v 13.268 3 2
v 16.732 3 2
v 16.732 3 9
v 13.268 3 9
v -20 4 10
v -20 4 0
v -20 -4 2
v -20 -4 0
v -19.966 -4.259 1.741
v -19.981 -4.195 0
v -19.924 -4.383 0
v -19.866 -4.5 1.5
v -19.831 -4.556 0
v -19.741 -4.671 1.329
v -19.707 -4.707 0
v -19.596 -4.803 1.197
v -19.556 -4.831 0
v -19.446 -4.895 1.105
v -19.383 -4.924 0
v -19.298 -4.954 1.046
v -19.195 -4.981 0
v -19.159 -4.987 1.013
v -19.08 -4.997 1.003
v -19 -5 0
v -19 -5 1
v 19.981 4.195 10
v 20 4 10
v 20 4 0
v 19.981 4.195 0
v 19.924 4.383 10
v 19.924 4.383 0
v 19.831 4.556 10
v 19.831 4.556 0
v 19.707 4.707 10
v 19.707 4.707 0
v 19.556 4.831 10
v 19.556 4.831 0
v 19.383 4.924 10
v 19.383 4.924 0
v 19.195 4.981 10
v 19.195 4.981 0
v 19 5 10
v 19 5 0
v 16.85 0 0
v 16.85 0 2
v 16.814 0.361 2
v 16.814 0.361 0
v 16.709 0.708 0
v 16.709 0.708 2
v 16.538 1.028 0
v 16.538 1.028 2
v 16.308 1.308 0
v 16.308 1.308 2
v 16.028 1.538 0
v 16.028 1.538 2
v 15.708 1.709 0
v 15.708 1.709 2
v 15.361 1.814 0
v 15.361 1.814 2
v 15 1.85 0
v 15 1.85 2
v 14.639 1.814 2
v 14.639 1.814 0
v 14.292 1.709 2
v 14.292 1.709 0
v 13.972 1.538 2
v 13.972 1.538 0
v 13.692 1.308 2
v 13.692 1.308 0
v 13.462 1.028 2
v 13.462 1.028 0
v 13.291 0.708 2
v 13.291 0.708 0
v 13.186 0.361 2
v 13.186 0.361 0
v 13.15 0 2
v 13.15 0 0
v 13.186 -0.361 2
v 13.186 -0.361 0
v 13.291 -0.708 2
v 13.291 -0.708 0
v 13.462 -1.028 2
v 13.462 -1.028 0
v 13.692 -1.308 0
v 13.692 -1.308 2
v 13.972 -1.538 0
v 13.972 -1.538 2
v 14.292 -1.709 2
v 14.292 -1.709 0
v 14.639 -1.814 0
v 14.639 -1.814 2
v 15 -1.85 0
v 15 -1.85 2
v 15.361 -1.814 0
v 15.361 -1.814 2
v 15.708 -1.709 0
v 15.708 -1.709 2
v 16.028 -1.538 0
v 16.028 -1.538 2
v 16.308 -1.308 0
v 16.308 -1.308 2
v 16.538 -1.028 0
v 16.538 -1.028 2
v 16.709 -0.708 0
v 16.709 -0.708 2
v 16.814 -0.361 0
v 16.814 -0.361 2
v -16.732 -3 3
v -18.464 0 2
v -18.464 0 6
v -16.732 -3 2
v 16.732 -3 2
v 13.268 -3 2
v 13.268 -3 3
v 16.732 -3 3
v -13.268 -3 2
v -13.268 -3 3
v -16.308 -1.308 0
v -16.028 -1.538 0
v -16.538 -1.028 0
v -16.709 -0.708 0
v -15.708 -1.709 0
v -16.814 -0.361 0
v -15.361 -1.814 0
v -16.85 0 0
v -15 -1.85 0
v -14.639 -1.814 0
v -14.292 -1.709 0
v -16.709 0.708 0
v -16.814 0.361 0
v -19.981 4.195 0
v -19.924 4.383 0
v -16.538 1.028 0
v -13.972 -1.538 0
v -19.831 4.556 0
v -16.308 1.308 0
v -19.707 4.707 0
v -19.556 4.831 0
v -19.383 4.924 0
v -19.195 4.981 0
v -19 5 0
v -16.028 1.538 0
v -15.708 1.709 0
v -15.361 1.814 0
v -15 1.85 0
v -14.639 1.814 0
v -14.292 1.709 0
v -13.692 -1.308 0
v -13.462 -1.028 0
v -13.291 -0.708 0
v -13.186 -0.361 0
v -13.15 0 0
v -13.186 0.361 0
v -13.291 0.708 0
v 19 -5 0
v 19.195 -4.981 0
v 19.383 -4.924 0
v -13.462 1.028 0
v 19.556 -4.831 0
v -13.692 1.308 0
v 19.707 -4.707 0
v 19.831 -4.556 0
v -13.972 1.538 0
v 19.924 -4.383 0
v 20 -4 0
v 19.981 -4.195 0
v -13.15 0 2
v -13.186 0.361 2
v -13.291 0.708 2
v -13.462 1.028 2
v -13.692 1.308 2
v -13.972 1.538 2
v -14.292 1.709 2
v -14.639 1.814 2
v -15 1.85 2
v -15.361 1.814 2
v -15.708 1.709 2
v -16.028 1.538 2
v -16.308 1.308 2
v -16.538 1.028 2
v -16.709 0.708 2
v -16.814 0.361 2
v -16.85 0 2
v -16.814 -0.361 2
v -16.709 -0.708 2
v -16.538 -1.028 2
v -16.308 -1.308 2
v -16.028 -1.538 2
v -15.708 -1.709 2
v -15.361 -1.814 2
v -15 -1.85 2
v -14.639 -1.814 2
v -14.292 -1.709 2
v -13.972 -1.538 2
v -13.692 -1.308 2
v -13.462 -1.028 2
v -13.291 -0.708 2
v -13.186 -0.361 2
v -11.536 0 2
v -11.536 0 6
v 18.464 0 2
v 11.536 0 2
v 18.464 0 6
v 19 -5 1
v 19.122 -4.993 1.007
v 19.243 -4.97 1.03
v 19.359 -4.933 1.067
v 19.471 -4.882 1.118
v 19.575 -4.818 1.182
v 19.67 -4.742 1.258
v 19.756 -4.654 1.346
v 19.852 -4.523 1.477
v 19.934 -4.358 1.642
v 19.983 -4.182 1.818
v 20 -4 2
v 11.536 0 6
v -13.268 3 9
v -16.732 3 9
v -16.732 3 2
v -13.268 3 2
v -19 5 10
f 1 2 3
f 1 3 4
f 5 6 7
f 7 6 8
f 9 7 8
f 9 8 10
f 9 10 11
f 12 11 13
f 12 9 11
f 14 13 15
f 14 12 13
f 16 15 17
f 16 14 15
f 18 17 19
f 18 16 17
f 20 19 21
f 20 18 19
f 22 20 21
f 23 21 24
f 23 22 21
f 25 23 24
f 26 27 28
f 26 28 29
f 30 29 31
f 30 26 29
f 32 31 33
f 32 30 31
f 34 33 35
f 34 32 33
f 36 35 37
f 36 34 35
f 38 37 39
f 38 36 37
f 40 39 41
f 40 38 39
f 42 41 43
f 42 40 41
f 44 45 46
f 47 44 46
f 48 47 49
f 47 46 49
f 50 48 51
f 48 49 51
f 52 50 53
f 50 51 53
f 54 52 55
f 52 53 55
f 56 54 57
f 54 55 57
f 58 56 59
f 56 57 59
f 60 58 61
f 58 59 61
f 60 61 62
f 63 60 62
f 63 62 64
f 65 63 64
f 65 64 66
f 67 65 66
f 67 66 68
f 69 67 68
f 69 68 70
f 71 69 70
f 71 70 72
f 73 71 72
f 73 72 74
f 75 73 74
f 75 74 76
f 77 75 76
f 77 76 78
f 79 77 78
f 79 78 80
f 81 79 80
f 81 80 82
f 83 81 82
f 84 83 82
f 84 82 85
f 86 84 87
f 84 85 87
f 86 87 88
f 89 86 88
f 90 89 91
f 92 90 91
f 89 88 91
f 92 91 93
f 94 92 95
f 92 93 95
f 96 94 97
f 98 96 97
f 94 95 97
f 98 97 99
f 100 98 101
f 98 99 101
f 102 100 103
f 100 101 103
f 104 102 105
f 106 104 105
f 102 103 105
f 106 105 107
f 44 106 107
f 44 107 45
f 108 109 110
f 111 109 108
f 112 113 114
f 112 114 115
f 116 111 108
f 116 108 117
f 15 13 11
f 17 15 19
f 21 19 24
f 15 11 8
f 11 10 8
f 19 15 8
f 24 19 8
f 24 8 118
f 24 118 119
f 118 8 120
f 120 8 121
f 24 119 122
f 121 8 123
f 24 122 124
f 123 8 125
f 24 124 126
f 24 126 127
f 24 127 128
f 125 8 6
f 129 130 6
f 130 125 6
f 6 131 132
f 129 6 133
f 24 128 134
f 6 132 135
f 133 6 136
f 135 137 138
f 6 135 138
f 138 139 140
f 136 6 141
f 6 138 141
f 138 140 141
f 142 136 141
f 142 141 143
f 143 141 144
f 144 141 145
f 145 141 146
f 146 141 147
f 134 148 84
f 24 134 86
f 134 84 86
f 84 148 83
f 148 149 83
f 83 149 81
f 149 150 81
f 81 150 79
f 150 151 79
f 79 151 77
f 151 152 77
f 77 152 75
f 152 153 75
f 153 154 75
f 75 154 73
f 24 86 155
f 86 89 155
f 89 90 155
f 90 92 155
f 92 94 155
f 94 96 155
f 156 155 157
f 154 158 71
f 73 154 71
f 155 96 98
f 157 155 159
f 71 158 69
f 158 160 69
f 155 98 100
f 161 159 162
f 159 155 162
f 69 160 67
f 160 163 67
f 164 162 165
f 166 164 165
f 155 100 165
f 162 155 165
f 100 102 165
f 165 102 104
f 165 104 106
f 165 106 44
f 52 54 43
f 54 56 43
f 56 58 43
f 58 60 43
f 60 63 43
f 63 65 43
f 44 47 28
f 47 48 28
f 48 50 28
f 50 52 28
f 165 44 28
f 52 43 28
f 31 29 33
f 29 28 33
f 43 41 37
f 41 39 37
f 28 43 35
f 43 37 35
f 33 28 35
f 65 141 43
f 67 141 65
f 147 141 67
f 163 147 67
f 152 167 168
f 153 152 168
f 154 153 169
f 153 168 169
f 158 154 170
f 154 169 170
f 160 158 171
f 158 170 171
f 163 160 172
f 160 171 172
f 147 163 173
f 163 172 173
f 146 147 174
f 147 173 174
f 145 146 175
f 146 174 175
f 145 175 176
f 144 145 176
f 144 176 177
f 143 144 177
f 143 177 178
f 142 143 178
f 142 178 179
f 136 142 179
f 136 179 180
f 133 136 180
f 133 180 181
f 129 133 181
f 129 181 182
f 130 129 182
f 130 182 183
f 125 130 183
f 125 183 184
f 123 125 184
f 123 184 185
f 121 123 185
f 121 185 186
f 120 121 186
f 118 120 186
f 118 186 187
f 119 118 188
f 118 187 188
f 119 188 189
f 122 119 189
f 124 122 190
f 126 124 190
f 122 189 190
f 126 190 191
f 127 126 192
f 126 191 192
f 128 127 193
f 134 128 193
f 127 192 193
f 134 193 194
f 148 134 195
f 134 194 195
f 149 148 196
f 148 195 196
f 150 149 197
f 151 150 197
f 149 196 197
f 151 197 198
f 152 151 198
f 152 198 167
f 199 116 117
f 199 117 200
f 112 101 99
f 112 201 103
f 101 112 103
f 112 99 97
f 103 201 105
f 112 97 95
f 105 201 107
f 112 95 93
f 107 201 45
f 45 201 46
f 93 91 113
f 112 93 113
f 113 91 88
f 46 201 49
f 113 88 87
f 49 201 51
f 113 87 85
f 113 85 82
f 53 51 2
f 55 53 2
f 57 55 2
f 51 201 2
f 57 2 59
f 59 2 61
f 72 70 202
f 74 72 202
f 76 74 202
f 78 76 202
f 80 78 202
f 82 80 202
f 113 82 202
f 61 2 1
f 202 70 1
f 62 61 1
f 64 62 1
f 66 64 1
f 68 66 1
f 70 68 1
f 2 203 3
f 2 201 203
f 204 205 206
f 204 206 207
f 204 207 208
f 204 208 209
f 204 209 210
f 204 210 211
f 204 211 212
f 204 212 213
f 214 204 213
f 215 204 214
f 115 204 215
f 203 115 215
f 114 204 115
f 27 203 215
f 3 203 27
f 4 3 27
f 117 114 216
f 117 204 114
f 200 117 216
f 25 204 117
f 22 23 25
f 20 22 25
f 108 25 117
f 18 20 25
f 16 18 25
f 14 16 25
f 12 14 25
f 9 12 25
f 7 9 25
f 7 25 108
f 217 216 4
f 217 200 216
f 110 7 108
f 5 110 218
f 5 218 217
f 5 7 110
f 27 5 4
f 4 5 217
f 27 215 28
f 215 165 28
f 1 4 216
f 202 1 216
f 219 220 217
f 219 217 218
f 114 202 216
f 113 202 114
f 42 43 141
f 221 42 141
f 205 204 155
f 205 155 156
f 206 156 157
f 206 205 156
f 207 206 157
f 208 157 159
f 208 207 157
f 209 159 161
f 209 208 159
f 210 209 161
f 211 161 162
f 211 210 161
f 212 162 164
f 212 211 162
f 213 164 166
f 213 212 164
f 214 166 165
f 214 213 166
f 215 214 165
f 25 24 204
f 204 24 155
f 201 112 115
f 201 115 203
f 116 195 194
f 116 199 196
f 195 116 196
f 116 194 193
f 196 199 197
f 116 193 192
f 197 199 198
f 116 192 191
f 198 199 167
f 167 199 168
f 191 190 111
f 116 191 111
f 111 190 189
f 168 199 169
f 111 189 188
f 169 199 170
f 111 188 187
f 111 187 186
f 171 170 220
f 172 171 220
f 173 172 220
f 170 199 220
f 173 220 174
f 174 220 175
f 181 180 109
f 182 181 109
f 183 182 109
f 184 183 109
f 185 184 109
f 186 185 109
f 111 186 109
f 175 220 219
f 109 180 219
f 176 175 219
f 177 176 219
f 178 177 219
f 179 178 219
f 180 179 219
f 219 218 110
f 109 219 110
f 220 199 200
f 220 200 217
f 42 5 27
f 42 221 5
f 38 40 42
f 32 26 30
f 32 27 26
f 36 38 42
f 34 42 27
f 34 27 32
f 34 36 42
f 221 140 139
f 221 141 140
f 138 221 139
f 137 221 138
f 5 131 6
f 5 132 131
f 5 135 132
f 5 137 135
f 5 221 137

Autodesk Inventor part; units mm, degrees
ref_plane "YZ Plane" through (0, 0, 0) normal (1, 0, 0) x (0, 1, 0)
ref_plane "XZ Plane" through (0, 0, 0) normal (0, 1, 0) x (-1, 0, 0)
sketch "Sketch1" plane through (0, 0, 0) normal (0, 0, 1) x (1, 0, 0)
  line L0 (-20, -5) -> (20, -5)
  line L1 (20, -5) -> (20, 5)
  line L2 (20, 5) -> (-20, 5)
  line L3 (-20, 5) -> (-20, -5)
  line L4 (-20, -5) -> (20, 5) construction
  line L5 (20, -5) -> (-20, 5) construction
  point P0 (0, 0)
  dimension "d0" = 10
  dimension "d1" = 40
extrude "Extrusion1" add sketch "Sketch1" along normal blind 10
sketch "Sketch2" plane through (0, 0, 10) normal (0, 0, 1) x (1, 0, 0)
  line L0 (-28, 0) -> (28, 0) projected
  circle A0 centre (-15, 0) radius 1.85
  circle A1 centre (15, 0) radius 1.85
  point P0 (0, 0)
  point P1 (16.85, 0)
  point P2 (13.15, 0)
  dimension "d4" = 3.7
  dimension "d5" = 3.7
  dimension "d6" = 15
  dimension "d7" = 15
extrude "Extrusion2" cut sketch "Sketch2" against normal through all
chamfer "Chamfer1" distance 9 angle 45 1 edges at (0, -5, 10)
ref_plane "Work Plane1" through (0, 0, 2) normal (0, 0, -1) x (-1, 0, 0)
sketch "Sketch3" plane through (0, 0, 2) normal (0, 0, -1) x (-1, 0, 0)
  circle A0 centre (15, 0) radius 1.85 projected
  circle A1 centre (-15, 0) radius 1.85 projected
  line L0 (11.5359, 0) -> (13.2679, 3)
  line L1 (13.2679, 3) -> (16.7321, 3)
  line L2 (16.7321, 3) -> (18.4641, 0)
  line L3 (18.4641, 0) -> (16.7321, -3)
  line L4 (16.7321, -3) -> (13.2679, -3)
  line L5 (13.2679, -3) -> (11.5359, 0)
  line L6 (-18.4641, 0) -> (-16.7321, 3)
  line L7 (-16.7321, 3) -> (-13.2679, 3)
  line L8 (-13.2679, 3) -> (-11.5359, 0)
  line L9 (-11.5359, 0) -> (-13.2679, -3)
  line L10 (-13.2679, -3) -> (-16.7321, -3)
  line L11 (-16.7321, -3) -> (-18.4641, 0)
  point P0 (0, 0)
  point P1 (15, 3)
  dimension "d14" = 6
  dimension "d15" = 6
extrude "Extrusion3" cut sketch "Sketch3" against normal up to surface contours A1 | L0 L1 L2 L3 L4 L5 | L6 L7 L8 L9 L10 L11 surface through (-10, -0.5, 5.5) normal (0, -0.7071068, 0.7071068)
fillet "Fillet1" radius 1 4 edges at (20, 5, 5) (20, -5, 0.5) (-20, 5, 5) (-20, -5, 0.5)
equation "\"d5\" = d4"
equation "\"d7\" = d6"
equation "\"d15\" = d14"
properties part number "_3DPrint"
